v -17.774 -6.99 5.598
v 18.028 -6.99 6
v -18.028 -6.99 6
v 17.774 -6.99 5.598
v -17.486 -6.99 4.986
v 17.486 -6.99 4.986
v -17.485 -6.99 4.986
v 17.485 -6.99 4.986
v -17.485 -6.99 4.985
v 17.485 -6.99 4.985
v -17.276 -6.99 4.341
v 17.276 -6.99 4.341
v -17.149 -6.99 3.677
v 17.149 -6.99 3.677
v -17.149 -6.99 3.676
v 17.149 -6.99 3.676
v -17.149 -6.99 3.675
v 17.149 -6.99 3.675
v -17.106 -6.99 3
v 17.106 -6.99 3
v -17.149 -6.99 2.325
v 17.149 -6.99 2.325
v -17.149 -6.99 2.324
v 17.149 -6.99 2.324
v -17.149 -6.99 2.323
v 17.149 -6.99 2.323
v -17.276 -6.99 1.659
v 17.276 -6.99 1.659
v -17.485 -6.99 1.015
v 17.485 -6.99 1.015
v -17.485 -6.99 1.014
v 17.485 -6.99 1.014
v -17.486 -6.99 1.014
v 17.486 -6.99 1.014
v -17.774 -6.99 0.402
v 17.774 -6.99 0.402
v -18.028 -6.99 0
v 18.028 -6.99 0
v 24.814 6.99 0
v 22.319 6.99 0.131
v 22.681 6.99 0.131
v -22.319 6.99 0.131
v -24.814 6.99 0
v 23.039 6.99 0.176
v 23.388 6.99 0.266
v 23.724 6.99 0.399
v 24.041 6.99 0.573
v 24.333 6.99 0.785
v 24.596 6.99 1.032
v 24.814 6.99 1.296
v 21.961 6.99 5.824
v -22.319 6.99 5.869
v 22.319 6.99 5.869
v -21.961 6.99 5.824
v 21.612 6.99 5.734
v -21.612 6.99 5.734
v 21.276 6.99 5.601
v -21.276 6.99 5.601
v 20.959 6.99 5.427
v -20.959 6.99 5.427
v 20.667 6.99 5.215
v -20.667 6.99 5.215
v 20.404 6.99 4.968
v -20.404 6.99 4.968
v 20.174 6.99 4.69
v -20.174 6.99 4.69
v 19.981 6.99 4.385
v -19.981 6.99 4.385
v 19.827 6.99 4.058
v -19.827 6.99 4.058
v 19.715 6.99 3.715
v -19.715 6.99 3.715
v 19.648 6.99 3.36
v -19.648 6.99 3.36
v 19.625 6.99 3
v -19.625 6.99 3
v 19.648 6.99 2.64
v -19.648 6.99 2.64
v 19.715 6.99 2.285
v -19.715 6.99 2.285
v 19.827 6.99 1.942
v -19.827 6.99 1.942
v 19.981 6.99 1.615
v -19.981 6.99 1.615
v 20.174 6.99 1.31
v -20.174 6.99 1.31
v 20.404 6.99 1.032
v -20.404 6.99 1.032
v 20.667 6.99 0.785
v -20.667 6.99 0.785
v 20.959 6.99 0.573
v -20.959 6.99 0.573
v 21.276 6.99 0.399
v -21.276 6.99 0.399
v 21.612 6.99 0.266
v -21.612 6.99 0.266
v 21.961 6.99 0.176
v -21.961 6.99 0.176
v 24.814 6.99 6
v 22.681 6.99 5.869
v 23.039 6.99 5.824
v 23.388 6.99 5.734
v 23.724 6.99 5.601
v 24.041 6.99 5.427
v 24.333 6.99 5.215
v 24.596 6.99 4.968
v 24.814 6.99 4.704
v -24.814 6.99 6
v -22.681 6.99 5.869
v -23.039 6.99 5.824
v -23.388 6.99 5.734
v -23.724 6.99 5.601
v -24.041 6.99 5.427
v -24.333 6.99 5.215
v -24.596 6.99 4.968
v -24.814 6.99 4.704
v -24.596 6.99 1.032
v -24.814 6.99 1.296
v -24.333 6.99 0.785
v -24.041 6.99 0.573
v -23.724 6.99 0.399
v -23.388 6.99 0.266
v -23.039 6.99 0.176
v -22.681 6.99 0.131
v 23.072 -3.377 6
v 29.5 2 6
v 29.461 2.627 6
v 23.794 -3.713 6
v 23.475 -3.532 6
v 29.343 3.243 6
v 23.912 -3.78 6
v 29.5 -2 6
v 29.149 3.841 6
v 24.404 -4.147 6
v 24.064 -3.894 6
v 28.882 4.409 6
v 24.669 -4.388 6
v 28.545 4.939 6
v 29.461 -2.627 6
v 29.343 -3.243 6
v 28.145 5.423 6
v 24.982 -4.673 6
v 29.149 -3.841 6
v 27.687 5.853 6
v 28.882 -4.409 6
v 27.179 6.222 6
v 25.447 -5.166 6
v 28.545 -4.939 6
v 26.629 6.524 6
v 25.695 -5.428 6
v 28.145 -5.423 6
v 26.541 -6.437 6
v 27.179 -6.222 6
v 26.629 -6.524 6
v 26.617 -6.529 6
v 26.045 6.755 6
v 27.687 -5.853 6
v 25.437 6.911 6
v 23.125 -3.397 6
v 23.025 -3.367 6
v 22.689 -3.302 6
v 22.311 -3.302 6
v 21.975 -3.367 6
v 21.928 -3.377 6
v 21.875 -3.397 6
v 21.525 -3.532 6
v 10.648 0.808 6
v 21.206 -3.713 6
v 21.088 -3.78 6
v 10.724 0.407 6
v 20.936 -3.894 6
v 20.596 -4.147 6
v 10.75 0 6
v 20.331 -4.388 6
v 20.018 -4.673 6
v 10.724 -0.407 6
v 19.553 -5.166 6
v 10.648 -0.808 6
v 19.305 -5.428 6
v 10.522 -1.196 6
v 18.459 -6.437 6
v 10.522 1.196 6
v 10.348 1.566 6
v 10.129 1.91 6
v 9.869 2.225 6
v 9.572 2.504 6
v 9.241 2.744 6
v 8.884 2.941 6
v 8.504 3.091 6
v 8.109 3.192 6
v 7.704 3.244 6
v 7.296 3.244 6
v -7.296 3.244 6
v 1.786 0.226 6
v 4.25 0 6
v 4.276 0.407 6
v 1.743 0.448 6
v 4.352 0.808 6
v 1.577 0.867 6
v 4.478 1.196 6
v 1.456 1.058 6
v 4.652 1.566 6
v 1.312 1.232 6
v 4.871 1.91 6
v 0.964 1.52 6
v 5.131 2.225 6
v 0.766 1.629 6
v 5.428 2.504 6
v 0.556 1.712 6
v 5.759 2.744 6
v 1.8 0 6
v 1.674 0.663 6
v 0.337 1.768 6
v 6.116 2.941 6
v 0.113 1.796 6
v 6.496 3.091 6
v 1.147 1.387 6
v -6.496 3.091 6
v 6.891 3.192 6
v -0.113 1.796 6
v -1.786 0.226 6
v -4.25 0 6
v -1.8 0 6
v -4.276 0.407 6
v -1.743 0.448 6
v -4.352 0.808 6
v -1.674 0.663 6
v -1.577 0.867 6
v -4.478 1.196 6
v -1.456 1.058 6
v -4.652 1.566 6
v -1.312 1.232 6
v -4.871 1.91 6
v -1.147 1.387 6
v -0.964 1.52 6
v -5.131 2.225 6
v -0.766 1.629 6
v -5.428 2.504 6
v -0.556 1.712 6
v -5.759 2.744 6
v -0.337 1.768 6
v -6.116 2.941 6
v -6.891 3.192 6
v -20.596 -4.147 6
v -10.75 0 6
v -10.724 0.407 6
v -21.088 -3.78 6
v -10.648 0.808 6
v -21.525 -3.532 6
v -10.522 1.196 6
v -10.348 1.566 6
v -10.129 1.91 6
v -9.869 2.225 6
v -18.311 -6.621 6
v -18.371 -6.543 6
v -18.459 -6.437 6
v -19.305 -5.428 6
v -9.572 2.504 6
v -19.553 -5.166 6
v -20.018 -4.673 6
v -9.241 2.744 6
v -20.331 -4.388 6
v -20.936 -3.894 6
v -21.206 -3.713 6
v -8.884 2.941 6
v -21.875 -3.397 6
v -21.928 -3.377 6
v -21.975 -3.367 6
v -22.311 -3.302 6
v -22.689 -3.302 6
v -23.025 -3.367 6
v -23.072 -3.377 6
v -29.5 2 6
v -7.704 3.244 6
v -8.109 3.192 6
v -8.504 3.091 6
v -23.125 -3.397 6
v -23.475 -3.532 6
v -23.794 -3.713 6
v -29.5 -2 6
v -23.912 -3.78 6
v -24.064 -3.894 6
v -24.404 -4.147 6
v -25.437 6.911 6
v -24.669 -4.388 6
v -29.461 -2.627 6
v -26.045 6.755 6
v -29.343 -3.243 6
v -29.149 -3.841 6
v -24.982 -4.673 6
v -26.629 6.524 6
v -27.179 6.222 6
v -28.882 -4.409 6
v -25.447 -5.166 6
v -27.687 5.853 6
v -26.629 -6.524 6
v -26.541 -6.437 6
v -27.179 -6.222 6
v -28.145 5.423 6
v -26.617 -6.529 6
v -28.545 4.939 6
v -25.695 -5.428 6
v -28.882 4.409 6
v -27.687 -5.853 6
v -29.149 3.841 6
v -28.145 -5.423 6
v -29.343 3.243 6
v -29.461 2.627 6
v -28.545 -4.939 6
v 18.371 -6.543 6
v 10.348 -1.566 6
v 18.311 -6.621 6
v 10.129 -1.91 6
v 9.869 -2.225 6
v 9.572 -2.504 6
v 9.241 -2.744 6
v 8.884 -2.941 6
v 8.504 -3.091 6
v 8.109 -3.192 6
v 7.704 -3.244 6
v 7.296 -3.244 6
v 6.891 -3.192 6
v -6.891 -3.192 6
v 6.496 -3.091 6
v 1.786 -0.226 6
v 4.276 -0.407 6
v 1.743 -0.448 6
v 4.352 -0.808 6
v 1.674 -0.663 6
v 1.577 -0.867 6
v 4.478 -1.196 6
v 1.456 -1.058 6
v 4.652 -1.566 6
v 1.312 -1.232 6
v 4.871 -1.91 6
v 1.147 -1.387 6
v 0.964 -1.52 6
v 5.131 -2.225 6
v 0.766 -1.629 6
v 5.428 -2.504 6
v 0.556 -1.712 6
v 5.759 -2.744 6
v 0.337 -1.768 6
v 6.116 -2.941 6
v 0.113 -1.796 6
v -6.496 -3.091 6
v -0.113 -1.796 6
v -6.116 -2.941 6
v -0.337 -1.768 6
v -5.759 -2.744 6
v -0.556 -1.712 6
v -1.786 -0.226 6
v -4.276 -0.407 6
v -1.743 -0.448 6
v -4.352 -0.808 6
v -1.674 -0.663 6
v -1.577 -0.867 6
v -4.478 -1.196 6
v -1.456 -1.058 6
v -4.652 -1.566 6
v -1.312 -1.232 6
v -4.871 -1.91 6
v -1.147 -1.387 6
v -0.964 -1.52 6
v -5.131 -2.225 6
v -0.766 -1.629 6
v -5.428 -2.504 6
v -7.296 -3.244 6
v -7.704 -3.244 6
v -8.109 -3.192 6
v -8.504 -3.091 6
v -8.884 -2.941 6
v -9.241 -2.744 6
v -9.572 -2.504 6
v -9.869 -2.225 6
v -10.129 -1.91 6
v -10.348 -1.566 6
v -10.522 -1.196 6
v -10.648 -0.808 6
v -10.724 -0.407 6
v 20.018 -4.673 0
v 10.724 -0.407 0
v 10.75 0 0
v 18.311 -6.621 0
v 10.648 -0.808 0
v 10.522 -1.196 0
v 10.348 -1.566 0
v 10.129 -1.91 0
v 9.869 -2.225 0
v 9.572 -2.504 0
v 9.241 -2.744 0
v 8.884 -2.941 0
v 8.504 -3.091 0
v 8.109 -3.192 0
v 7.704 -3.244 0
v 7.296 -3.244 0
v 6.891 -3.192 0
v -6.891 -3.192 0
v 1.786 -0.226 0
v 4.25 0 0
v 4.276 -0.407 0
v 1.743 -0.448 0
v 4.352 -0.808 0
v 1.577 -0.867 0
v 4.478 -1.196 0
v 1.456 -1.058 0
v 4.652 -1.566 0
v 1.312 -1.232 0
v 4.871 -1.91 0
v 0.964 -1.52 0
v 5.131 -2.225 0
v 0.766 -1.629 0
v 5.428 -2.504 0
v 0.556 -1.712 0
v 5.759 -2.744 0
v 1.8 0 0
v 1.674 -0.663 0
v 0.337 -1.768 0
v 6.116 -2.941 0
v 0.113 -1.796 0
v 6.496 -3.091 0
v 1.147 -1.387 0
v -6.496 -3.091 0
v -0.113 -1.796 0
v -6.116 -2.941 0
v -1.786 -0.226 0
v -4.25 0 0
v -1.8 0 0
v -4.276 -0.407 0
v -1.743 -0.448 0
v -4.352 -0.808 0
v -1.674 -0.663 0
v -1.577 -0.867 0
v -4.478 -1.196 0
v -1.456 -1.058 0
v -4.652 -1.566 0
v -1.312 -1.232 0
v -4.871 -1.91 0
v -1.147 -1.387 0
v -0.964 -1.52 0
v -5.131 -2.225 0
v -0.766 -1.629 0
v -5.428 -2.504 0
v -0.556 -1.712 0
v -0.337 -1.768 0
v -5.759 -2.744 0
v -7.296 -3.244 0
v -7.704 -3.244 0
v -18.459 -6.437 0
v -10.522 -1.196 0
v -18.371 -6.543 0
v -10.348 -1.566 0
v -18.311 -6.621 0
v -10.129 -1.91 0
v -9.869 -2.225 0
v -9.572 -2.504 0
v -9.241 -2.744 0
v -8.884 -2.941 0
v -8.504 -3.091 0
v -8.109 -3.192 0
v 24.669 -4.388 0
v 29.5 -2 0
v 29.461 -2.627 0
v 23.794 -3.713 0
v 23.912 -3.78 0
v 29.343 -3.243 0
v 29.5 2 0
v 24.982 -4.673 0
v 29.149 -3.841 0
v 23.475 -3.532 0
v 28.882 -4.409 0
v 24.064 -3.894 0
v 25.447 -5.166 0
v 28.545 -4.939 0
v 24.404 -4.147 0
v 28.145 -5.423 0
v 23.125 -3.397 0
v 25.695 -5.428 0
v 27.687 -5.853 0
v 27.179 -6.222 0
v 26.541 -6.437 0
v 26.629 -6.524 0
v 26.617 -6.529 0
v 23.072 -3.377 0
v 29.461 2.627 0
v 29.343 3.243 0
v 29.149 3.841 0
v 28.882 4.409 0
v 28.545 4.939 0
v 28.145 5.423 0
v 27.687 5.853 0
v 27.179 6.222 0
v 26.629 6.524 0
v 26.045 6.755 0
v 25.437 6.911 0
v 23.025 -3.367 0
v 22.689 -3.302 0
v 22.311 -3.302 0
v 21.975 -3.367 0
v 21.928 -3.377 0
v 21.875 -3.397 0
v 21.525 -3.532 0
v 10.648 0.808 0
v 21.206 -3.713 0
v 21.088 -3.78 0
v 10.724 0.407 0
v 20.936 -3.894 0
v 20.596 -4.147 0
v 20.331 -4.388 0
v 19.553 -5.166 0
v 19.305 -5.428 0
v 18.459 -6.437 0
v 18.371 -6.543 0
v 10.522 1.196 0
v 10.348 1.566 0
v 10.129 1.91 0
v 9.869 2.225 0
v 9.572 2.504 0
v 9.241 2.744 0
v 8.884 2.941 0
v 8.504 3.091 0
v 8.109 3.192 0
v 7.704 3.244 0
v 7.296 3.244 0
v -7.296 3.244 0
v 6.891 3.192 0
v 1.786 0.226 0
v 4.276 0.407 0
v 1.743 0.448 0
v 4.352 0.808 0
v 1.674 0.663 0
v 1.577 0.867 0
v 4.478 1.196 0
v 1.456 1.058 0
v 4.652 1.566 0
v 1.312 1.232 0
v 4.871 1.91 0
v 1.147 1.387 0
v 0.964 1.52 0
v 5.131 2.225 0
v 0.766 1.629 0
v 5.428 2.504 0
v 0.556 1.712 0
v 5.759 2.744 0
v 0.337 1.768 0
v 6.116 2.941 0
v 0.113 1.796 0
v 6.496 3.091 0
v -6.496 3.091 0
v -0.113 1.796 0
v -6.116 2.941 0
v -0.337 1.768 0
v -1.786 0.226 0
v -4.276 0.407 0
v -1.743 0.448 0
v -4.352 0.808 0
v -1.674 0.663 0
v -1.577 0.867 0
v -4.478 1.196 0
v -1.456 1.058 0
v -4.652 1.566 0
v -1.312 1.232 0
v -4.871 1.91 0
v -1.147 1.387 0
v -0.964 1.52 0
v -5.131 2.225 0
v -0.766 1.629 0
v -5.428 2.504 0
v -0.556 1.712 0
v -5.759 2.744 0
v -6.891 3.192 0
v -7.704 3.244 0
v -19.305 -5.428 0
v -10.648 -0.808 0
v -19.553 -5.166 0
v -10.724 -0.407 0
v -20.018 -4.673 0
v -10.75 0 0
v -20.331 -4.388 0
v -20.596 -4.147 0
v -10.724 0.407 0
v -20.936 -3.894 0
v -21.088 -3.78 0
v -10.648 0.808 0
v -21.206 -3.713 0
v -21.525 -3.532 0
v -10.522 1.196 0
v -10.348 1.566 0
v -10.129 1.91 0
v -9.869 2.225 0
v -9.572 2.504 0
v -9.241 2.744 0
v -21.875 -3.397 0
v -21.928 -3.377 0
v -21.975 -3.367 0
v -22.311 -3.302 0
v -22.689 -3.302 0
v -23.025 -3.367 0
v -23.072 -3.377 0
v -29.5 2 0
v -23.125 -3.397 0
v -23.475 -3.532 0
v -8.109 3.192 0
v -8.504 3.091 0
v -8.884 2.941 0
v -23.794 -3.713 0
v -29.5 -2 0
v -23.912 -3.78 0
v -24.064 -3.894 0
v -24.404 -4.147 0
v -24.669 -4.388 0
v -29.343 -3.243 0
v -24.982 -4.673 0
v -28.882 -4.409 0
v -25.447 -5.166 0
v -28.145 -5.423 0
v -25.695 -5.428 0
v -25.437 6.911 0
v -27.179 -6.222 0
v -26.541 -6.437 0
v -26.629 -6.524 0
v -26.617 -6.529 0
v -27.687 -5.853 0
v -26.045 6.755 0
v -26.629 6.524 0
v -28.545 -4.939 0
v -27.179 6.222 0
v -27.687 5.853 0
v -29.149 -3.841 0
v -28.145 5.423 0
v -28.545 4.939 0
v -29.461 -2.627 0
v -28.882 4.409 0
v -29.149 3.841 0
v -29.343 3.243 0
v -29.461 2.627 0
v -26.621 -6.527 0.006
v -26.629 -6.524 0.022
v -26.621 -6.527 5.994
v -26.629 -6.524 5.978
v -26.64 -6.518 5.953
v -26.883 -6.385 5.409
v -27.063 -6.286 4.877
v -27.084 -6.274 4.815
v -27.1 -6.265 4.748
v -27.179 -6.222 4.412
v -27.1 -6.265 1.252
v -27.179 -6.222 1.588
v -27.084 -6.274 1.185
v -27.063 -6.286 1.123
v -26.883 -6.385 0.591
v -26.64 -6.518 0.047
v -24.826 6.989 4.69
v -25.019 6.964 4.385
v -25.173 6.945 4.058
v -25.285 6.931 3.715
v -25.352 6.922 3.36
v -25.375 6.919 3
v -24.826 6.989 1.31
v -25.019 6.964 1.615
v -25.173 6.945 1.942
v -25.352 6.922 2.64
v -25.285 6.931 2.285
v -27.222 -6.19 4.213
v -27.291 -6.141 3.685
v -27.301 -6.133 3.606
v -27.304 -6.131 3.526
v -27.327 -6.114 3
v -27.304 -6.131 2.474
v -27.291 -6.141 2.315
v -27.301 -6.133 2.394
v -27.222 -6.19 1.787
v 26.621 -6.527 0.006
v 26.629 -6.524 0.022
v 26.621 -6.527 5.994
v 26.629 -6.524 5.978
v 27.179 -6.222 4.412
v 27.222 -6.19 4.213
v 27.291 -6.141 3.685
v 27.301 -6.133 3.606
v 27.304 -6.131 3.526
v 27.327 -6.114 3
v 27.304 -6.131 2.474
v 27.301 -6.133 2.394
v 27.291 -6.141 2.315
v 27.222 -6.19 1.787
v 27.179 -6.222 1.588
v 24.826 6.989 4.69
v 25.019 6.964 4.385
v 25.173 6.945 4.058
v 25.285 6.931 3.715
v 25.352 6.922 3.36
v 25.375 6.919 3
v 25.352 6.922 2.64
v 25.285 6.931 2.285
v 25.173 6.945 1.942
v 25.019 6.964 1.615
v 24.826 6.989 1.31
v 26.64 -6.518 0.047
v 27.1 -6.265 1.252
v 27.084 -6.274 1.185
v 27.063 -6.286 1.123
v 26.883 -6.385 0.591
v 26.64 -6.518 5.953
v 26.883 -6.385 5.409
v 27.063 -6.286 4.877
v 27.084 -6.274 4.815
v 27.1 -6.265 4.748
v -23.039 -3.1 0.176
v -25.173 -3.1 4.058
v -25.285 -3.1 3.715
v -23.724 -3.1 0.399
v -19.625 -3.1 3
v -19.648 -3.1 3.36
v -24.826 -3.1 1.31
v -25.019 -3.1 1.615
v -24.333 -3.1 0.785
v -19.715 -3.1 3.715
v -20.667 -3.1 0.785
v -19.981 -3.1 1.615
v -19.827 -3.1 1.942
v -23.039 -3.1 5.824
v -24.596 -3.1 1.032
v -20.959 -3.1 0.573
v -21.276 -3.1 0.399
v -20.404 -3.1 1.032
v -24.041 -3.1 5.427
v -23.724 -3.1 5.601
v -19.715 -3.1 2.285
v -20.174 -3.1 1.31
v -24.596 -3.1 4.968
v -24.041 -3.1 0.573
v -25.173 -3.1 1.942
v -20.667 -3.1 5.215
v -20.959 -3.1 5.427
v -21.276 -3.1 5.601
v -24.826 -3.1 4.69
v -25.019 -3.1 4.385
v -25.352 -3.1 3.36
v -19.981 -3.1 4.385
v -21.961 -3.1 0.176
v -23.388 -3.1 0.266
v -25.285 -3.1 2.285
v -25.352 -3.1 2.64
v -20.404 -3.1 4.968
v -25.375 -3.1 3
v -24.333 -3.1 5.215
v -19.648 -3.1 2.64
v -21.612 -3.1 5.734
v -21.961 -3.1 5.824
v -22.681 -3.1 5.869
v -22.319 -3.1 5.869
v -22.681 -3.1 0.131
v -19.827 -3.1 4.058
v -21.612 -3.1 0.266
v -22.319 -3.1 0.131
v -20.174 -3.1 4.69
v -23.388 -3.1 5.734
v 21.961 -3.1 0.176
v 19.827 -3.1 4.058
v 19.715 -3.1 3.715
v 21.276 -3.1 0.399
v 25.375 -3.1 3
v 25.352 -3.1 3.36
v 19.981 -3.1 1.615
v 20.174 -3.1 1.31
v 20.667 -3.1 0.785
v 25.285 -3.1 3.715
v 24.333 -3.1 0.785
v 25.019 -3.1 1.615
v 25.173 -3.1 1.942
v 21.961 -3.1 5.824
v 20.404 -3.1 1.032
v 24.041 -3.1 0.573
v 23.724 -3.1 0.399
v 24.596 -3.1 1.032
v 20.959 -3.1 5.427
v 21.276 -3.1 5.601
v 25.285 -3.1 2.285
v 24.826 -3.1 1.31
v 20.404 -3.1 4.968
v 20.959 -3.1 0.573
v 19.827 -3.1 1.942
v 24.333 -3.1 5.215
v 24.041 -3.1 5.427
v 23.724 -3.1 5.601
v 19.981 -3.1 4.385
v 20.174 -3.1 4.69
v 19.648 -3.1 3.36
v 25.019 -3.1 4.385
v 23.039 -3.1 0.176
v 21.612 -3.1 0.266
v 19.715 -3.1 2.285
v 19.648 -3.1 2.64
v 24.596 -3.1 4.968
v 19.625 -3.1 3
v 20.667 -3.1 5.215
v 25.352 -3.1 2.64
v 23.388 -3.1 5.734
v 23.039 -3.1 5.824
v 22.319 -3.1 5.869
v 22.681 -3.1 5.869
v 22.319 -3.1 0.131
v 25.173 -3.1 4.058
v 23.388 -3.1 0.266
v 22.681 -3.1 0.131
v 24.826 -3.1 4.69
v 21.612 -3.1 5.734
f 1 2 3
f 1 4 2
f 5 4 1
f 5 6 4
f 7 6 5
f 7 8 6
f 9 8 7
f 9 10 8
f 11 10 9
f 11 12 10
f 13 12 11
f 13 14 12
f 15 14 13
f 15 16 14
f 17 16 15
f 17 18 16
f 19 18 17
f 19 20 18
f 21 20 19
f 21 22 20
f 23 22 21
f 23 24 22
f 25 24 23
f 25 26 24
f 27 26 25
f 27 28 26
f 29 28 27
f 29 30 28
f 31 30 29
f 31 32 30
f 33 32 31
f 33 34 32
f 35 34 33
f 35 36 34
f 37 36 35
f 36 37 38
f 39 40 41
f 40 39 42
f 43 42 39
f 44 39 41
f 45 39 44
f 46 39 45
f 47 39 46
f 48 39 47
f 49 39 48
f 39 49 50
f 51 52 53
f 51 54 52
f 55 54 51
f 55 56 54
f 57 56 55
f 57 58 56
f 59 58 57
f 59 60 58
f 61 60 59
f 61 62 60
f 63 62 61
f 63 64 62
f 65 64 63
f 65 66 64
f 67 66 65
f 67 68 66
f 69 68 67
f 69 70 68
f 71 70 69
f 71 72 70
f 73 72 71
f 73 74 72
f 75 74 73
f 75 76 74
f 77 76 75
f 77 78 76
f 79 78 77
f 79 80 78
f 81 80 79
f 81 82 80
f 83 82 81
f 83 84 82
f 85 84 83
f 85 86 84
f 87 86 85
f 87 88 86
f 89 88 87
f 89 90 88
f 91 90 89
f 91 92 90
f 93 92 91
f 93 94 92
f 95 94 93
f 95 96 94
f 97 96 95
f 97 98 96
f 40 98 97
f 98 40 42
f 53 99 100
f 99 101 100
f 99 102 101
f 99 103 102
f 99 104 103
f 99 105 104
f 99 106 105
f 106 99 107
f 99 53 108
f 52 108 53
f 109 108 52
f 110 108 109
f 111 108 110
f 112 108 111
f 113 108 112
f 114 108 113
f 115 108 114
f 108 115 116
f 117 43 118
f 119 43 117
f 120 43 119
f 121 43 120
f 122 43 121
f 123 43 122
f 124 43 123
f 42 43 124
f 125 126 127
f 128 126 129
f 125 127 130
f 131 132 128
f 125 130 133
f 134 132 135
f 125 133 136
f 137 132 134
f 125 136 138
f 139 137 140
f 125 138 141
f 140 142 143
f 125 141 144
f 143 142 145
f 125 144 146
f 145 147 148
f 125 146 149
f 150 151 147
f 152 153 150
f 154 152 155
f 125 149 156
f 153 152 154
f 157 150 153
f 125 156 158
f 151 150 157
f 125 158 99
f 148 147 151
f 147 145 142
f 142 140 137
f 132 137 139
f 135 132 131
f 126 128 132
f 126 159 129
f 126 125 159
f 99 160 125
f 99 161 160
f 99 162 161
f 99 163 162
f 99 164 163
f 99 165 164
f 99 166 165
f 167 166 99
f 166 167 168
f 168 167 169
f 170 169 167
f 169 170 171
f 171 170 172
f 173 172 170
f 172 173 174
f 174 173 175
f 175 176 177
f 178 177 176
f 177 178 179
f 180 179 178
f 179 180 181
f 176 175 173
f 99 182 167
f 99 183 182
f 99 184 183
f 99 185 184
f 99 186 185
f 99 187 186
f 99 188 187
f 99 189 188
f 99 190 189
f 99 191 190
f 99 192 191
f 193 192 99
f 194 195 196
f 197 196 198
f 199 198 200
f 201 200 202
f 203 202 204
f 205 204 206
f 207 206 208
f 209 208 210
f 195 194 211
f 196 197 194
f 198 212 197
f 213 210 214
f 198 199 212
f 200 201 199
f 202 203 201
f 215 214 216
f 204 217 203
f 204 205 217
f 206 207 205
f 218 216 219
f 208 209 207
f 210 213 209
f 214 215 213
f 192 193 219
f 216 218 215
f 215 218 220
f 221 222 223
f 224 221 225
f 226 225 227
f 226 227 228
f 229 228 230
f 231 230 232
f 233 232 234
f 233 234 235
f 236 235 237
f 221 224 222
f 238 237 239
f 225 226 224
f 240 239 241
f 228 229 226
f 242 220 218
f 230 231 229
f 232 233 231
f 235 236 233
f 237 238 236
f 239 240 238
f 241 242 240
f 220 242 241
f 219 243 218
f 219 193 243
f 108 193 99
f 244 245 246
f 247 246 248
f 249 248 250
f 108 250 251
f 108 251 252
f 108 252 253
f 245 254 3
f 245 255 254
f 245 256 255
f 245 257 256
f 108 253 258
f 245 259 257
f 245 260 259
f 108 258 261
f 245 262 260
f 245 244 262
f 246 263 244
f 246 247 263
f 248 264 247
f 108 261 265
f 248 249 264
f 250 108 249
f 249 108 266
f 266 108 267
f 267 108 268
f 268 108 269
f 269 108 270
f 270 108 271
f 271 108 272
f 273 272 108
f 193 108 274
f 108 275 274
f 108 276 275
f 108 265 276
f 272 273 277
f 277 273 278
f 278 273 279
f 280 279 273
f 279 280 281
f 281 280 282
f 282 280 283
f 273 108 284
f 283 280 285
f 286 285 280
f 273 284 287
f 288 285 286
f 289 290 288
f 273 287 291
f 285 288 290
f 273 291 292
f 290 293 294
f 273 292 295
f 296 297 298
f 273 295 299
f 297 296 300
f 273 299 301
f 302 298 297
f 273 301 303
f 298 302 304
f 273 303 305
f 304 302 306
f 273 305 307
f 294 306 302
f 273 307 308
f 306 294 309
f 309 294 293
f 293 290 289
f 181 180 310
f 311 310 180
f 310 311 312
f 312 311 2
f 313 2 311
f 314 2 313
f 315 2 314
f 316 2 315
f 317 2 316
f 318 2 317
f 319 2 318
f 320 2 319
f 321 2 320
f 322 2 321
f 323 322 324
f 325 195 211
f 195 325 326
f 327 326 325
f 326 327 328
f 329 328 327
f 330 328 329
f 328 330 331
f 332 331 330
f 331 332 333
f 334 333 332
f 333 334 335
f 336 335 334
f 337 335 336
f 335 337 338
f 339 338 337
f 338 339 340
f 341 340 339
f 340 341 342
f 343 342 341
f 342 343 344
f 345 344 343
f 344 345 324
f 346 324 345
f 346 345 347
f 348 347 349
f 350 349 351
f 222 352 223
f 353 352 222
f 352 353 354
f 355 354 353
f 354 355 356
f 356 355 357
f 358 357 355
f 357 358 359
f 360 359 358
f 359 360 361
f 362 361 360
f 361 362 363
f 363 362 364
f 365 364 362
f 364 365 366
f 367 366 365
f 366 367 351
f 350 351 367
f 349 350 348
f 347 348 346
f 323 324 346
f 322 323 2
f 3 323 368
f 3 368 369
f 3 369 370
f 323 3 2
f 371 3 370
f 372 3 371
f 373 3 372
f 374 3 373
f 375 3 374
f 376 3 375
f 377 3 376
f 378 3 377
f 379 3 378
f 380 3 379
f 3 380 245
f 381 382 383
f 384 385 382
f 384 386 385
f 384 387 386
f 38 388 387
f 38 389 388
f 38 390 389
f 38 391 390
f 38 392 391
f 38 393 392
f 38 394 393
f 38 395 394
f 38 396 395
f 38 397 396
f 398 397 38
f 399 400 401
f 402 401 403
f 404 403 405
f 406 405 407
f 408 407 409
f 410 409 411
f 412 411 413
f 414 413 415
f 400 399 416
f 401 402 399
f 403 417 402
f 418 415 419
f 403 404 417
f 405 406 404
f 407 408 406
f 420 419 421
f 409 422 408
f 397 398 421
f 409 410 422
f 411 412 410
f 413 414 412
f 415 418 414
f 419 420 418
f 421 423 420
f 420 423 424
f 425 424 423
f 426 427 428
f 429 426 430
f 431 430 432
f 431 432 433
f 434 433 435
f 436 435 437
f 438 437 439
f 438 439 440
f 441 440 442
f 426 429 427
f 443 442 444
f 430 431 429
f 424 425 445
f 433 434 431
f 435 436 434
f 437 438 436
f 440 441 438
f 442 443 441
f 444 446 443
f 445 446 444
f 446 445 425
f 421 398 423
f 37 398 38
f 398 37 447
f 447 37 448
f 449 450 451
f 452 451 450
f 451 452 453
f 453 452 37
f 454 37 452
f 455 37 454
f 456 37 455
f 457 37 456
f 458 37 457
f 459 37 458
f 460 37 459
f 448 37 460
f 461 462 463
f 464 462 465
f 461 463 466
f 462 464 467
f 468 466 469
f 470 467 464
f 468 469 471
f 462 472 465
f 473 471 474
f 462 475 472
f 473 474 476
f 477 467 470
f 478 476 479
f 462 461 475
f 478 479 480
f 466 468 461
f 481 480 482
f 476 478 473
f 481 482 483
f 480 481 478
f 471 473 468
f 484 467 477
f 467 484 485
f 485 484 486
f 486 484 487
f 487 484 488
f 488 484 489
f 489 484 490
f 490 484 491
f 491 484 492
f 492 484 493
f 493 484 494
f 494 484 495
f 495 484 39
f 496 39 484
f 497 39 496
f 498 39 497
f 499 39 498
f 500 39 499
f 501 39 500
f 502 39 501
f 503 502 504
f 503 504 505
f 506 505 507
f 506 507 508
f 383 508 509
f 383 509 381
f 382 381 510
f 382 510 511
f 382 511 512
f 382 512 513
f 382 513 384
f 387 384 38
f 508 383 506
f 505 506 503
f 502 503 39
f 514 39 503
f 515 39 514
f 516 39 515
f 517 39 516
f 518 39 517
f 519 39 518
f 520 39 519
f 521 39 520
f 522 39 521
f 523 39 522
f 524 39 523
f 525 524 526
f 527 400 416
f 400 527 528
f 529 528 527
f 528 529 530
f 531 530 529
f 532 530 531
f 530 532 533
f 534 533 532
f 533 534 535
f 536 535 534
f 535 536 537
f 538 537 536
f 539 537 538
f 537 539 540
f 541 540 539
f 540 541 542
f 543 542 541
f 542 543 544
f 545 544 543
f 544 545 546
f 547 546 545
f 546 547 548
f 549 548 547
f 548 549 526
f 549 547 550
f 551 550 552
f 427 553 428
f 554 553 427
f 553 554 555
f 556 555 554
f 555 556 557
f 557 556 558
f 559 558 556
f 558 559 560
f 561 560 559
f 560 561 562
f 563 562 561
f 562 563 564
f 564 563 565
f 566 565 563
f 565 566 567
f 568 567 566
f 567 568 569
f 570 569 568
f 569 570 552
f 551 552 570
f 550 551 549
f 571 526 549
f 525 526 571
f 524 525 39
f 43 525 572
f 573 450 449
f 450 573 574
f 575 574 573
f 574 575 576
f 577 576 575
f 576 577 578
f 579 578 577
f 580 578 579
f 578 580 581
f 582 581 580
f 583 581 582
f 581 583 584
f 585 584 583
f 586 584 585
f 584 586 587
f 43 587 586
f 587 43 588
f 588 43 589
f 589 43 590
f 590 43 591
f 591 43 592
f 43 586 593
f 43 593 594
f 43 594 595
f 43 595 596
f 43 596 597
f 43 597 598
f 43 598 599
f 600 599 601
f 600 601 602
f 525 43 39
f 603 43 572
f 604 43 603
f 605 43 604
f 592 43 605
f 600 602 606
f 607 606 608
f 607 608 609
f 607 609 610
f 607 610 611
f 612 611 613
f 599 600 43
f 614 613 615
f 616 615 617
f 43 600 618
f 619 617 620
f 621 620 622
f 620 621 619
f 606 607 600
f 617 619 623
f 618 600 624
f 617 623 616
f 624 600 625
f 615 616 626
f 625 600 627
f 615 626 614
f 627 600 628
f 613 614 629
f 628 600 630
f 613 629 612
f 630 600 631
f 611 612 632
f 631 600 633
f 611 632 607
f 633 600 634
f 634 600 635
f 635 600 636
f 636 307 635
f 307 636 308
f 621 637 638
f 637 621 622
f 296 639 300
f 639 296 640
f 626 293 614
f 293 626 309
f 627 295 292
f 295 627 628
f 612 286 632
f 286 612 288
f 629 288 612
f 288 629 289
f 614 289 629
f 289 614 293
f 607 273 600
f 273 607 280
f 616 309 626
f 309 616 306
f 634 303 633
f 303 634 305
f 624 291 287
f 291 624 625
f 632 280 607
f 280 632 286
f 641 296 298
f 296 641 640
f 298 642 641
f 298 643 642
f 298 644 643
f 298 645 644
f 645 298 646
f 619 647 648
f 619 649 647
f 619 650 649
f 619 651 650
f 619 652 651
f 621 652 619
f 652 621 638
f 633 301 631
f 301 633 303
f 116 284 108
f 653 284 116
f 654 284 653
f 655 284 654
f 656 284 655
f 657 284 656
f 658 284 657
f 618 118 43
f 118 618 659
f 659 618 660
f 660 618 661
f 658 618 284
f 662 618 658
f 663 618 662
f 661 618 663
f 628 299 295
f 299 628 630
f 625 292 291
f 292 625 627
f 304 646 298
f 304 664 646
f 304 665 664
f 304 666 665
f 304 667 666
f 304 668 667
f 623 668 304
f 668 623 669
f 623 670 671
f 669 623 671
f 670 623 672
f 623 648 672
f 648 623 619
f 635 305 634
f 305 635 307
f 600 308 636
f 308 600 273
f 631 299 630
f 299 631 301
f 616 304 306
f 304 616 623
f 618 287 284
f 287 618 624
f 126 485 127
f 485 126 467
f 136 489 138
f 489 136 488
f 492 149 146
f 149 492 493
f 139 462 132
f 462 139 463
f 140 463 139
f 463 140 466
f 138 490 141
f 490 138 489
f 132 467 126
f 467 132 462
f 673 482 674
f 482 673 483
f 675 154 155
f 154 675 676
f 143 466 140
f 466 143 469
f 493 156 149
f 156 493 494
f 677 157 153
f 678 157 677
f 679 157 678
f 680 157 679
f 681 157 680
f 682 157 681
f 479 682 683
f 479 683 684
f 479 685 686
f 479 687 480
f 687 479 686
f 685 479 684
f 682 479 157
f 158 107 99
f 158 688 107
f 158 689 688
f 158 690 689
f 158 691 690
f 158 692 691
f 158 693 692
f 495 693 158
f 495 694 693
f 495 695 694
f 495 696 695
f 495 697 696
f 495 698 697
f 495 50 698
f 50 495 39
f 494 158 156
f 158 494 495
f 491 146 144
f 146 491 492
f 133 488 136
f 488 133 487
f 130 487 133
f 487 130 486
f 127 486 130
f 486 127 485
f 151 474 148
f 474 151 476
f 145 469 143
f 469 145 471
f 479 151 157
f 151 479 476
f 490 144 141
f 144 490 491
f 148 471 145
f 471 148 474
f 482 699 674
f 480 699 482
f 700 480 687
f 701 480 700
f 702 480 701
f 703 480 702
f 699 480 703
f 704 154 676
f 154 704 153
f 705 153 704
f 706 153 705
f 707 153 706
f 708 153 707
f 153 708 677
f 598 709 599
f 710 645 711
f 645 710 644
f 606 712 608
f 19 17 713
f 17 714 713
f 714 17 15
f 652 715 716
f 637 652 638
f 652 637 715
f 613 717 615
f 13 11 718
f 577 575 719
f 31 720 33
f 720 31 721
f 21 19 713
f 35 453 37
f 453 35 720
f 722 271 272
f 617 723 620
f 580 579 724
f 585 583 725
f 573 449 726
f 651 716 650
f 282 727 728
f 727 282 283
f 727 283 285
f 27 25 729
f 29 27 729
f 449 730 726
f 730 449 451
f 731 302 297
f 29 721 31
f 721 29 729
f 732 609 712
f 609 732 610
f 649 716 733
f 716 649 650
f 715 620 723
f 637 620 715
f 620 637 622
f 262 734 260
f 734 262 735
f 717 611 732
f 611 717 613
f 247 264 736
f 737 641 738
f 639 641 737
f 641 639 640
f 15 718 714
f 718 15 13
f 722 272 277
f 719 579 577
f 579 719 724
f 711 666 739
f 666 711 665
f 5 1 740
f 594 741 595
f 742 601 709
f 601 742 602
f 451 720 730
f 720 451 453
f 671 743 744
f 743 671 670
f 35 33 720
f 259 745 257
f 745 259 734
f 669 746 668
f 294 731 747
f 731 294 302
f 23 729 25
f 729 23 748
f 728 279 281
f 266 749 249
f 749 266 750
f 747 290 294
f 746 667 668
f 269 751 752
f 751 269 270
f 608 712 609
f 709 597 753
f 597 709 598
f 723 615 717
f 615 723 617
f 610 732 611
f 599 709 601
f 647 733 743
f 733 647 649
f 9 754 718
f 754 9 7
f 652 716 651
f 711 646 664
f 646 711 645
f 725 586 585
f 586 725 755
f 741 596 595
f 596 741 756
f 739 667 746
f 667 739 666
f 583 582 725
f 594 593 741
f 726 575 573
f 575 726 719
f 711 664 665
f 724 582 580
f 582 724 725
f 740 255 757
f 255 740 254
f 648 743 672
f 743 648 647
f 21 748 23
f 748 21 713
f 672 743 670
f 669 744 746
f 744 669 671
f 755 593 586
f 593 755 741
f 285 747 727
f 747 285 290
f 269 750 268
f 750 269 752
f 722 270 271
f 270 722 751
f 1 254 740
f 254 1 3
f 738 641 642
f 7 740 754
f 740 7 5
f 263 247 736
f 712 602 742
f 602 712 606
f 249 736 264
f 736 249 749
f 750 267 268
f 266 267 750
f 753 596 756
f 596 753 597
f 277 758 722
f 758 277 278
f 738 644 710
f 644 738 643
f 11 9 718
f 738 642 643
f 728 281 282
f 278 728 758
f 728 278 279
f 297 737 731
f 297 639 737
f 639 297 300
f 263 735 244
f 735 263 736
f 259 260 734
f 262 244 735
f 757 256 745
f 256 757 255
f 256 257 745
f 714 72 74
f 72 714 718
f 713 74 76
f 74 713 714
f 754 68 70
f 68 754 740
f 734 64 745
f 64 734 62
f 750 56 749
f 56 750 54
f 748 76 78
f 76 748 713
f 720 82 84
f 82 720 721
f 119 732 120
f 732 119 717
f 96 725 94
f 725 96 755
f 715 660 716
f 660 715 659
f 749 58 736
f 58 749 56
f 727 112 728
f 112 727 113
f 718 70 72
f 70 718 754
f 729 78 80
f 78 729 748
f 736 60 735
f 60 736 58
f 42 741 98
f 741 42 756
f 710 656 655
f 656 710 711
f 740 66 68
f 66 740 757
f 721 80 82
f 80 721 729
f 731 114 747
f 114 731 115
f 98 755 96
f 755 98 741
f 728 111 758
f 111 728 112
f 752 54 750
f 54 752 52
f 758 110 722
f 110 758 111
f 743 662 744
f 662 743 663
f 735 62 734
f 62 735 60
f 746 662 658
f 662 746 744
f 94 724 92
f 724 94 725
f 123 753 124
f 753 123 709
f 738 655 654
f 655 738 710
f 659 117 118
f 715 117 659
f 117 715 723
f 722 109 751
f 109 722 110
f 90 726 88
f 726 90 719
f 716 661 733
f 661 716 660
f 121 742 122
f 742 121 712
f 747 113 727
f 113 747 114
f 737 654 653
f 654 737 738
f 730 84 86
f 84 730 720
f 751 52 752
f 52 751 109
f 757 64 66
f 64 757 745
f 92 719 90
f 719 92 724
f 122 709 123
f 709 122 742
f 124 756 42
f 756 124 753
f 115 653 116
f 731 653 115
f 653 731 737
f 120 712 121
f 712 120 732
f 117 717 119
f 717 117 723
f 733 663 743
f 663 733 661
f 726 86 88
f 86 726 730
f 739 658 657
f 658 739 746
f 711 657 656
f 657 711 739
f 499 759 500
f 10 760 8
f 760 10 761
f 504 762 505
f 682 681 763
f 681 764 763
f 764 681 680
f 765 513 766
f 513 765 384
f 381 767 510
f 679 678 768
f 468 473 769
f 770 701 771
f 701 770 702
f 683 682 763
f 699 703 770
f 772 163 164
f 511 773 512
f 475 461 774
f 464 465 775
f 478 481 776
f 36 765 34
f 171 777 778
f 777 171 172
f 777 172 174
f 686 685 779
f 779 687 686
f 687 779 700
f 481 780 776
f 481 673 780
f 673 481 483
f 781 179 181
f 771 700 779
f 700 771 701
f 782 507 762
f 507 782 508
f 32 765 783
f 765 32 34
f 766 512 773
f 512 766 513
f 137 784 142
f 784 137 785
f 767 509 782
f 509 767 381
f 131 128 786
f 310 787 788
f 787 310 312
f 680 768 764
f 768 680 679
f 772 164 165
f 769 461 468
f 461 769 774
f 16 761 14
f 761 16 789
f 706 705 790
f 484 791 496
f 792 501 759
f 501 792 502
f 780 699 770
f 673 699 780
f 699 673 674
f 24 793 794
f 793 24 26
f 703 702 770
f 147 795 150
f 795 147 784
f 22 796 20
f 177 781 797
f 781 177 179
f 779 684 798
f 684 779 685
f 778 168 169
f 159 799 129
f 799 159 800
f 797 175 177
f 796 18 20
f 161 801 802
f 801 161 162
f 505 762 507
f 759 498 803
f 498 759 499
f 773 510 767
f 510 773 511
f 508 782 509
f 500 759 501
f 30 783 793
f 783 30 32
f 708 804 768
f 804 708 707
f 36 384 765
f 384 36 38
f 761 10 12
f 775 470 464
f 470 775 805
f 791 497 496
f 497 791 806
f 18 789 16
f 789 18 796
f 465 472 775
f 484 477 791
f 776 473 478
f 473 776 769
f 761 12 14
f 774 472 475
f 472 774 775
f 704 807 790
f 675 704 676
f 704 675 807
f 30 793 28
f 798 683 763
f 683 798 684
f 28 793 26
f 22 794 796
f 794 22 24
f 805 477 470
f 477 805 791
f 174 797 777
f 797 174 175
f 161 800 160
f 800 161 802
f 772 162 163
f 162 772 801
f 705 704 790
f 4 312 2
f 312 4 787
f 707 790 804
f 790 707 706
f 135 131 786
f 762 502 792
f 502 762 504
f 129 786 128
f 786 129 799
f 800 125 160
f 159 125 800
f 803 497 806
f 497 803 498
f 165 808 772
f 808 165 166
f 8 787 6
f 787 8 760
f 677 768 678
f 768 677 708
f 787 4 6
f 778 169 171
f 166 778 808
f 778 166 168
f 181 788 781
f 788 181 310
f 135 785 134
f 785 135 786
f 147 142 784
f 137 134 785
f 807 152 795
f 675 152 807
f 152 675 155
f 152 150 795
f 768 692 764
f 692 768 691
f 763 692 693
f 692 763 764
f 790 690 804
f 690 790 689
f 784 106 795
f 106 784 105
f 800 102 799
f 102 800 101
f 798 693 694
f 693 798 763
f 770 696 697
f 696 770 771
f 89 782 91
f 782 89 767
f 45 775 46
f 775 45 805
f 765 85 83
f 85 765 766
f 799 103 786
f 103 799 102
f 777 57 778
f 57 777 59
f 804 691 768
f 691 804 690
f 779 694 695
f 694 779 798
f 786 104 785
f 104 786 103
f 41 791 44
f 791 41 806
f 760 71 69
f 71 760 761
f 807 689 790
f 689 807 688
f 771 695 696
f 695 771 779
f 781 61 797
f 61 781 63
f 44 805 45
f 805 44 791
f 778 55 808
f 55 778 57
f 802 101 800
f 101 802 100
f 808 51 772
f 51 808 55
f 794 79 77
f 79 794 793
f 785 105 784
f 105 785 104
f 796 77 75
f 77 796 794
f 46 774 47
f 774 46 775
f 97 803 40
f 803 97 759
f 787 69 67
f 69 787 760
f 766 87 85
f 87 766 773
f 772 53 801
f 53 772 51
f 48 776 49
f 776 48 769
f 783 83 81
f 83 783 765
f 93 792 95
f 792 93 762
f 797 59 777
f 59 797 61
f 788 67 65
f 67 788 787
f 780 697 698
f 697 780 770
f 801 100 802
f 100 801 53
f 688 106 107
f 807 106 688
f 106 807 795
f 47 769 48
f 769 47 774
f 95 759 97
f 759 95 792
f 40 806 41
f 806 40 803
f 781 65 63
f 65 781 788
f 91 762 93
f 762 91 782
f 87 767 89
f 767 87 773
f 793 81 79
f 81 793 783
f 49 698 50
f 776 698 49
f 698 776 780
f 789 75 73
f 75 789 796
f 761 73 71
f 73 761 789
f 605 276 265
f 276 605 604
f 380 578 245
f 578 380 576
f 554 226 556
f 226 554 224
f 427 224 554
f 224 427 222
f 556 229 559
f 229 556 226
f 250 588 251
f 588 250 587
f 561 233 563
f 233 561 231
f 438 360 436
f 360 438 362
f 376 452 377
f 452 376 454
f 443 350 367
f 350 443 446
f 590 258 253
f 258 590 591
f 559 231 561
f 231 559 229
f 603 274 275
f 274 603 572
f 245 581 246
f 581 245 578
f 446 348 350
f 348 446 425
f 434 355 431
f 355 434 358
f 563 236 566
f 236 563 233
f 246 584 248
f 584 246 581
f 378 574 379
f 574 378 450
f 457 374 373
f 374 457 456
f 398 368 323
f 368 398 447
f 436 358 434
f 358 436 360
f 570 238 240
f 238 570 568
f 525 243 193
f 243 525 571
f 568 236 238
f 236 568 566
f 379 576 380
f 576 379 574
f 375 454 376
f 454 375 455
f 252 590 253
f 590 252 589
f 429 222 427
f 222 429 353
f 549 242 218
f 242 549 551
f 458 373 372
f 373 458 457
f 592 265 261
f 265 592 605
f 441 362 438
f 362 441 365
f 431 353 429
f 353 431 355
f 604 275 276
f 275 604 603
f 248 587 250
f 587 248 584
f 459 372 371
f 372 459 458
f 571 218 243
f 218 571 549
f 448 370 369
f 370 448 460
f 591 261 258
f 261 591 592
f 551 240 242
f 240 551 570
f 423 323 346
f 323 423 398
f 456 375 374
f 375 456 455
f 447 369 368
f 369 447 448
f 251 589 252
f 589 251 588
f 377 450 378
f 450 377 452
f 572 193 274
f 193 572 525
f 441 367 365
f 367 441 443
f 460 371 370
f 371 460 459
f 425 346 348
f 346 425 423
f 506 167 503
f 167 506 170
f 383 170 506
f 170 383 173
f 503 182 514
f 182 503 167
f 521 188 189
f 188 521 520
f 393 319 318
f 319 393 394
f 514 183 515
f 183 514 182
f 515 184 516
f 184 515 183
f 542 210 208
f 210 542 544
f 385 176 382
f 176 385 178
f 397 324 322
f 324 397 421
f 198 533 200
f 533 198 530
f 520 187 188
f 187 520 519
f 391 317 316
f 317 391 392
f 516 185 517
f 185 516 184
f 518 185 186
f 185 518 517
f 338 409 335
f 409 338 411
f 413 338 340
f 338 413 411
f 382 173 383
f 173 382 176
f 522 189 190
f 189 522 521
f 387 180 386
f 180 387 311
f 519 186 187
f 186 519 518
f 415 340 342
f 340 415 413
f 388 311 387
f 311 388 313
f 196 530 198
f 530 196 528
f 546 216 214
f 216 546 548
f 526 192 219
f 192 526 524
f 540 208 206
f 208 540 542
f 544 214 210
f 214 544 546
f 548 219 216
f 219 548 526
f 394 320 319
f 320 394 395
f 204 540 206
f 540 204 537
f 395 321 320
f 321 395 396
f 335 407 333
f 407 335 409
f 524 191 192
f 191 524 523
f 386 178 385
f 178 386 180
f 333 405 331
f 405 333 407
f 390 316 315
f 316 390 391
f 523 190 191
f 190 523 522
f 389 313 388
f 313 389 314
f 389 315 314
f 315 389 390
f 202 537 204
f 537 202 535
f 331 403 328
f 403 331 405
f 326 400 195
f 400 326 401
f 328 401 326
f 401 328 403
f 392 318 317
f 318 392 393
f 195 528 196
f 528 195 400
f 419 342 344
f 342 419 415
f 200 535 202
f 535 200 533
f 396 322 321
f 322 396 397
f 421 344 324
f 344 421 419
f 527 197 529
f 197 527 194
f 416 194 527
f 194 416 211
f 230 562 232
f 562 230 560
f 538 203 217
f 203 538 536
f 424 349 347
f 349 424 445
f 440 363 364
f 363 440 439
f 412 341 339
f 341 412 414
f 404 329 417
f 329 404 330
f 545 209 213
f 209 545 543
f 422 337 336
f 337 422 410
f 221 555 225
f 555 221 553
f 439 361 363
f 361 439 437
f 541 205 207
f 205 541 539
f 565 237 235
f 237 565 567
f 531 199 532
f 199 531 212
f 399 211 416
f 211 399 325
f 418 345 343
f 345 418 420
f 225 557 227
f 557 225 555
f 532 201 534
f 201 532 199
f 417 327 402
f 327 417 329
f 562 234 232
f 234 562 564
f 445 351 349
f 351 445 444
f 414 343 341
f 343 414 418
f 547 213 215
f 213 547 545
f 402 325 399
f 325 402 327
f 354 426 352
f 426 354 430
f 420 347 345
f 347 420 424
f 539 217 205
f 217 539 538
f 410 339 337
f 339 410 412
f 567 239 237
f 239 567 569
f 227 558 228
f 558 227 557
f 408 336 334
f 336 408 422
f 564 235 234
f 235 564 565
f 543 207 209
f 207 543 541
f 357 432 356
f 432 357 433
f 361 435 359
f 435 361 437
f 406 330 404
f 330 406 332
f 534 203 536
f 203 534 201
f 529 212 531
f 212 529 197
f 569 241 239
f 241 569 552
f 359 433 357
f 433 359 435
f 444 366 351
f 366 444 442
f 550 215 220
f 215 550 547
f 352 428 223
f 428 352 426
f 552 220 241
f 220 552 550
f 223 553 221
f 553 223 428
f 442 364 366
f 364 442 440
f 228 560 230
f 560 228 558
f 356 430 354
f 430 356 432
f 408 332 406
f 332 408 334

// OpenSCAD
$fn = 50;


difference() {
	union() {
		hull() {
			translate(v = [-9.5000000000, 2.0000000000, 0]) {
				cylinder(h = 6, r = 5);
			}
			translate(v = [9.5000000000, 2.0000000000, 0]) {
				cylinder(h = 6, r = 5);
			}
			translate(v = [-9.5000000000, -2.0000000000, 0]) {
				cylinder(h = 6, r = 5);
			}
			translate(v = [9.5000000000, -2.0000000000, 0]) {
				cylinder(h = 6, r = 5);
			}
		}
		translate(v = [-15.0000000000, 0.0000000000, 0]) {
			hull() {
				translate(v = [-9.5000000000, 2.0000000000, 0]) {
					cylinder(h = 6, r = 5);
				}
				translate(v = [9.5000000000, 2.0000000000, 0]) {
					cylinder(h = 6, r = 5);
				}
				translate(v = [-9.5000000000, -2.0000000000, 0]) {
					cylinder(h = 6, r = 5);
				}
				translate(v = [9.5000000000, -2.0000000000, 0]) {
					cylinder(h = 6, r = 5);
				}
			}
		}
		translate(v = [15.0000000000, 0.0000000000, 0]) {
			hull() {
				translate(v = [-9.5000000000, 2.0000000000, 0]) {
					cylinder(h = 6, r = 5);
				}
				translate(v = [9.5000000000, 2.0000000000, 0]) {
					cylinder(h = 6, r = 5);
				}
				translate(v = [-9.5000000000, -2.0000000000, 0]) {
					cylinder(h = 6, r = 5);
				}
				translate(v = [9.5000000000, -2.0000000000, 0]) {
					cylinder(h = 6, r = 5);
				}
			}
		}
	}
	union() {
		translate(v = [-22.5000000000, -7.0000000000, 3.0000000000]) {
			rotate(a = [90, 0, 0]) {
				difference() {
					union() {
						#translate(v = [0, 0, -14.0000000000]) {
							cylinder(h = 14, r = 2.6000000000);
						}
						#translate(v = [0, 0, -3.9000000000]) {
							cylinder(h = 3.9000000000, r1 = 2.8750000000, r2 = 5.4000000000);
						}
						#translate(v = [0, 0, -14.0000000000]) {
							cylinder(h = 14, r = 2.8750000000);
						}
						#translate(v = [0, 0, -14.0000000000]) {
							cylinder(h = 14, r = 2.6000000000);
						}
					}
					union();
				}
			}
		}
		translate(v = [22.5000000000, -7.0000000000, 3.0000000000]) {
			rotate(a = [90, 0, 0]) {
				difference() {
					union() {
						#translate(v = [0, 0, -14.0000000000]) {
							cylinder(h = 14, r = 2.6000000000);
						}
						#translate(v = [0, 0, -3.9000000000]) {
							cylinder(h = 3.9000000000, r1 = 2.8750000000, r2 = 5.4000000000);
						}
						#translate(v = [0, 0, -14.0000000000]) {
							cylinder(h = 14, r = 2.8750000000);
						}
						#translate(v = [0, 0, -14.0000000000]) {
							cylinder(h = 14, r = 2.6000000000);
						}
					}
					union();
				}
			}
		}
		translate(v = [-7.5000000000, 0.0000000000, 0]) {
			translate(v = [0, 0, -100]) {
				cylinder(h = 200, r = 3.2500000000);
			}
		}
		translate(v = [7.5000000000, 0.0000000000, 0]) {
			translate(v = [0, 0, -100]) {
				cylinder(h = 200, r = 3.2500000000);
			}
		}
		translate(v = [-7.5000000000, 0.0000000000, 0]) {
			translate(v = [0, 0, -100]) {
				cylinder(h = 200, r = 1.8000000000);
			}
		}
		translate(v = [0, 0, -100]) {
			cylinder(h = 200, r = 1.8000000000);
		}
		translate(v = [7.5000000000, 0.0000000000, 0]) {
			translate(v = [0, 0, -100]) {
				cylinder(h = 200, r = 1.8000000000);
			}
		}
	}
}
